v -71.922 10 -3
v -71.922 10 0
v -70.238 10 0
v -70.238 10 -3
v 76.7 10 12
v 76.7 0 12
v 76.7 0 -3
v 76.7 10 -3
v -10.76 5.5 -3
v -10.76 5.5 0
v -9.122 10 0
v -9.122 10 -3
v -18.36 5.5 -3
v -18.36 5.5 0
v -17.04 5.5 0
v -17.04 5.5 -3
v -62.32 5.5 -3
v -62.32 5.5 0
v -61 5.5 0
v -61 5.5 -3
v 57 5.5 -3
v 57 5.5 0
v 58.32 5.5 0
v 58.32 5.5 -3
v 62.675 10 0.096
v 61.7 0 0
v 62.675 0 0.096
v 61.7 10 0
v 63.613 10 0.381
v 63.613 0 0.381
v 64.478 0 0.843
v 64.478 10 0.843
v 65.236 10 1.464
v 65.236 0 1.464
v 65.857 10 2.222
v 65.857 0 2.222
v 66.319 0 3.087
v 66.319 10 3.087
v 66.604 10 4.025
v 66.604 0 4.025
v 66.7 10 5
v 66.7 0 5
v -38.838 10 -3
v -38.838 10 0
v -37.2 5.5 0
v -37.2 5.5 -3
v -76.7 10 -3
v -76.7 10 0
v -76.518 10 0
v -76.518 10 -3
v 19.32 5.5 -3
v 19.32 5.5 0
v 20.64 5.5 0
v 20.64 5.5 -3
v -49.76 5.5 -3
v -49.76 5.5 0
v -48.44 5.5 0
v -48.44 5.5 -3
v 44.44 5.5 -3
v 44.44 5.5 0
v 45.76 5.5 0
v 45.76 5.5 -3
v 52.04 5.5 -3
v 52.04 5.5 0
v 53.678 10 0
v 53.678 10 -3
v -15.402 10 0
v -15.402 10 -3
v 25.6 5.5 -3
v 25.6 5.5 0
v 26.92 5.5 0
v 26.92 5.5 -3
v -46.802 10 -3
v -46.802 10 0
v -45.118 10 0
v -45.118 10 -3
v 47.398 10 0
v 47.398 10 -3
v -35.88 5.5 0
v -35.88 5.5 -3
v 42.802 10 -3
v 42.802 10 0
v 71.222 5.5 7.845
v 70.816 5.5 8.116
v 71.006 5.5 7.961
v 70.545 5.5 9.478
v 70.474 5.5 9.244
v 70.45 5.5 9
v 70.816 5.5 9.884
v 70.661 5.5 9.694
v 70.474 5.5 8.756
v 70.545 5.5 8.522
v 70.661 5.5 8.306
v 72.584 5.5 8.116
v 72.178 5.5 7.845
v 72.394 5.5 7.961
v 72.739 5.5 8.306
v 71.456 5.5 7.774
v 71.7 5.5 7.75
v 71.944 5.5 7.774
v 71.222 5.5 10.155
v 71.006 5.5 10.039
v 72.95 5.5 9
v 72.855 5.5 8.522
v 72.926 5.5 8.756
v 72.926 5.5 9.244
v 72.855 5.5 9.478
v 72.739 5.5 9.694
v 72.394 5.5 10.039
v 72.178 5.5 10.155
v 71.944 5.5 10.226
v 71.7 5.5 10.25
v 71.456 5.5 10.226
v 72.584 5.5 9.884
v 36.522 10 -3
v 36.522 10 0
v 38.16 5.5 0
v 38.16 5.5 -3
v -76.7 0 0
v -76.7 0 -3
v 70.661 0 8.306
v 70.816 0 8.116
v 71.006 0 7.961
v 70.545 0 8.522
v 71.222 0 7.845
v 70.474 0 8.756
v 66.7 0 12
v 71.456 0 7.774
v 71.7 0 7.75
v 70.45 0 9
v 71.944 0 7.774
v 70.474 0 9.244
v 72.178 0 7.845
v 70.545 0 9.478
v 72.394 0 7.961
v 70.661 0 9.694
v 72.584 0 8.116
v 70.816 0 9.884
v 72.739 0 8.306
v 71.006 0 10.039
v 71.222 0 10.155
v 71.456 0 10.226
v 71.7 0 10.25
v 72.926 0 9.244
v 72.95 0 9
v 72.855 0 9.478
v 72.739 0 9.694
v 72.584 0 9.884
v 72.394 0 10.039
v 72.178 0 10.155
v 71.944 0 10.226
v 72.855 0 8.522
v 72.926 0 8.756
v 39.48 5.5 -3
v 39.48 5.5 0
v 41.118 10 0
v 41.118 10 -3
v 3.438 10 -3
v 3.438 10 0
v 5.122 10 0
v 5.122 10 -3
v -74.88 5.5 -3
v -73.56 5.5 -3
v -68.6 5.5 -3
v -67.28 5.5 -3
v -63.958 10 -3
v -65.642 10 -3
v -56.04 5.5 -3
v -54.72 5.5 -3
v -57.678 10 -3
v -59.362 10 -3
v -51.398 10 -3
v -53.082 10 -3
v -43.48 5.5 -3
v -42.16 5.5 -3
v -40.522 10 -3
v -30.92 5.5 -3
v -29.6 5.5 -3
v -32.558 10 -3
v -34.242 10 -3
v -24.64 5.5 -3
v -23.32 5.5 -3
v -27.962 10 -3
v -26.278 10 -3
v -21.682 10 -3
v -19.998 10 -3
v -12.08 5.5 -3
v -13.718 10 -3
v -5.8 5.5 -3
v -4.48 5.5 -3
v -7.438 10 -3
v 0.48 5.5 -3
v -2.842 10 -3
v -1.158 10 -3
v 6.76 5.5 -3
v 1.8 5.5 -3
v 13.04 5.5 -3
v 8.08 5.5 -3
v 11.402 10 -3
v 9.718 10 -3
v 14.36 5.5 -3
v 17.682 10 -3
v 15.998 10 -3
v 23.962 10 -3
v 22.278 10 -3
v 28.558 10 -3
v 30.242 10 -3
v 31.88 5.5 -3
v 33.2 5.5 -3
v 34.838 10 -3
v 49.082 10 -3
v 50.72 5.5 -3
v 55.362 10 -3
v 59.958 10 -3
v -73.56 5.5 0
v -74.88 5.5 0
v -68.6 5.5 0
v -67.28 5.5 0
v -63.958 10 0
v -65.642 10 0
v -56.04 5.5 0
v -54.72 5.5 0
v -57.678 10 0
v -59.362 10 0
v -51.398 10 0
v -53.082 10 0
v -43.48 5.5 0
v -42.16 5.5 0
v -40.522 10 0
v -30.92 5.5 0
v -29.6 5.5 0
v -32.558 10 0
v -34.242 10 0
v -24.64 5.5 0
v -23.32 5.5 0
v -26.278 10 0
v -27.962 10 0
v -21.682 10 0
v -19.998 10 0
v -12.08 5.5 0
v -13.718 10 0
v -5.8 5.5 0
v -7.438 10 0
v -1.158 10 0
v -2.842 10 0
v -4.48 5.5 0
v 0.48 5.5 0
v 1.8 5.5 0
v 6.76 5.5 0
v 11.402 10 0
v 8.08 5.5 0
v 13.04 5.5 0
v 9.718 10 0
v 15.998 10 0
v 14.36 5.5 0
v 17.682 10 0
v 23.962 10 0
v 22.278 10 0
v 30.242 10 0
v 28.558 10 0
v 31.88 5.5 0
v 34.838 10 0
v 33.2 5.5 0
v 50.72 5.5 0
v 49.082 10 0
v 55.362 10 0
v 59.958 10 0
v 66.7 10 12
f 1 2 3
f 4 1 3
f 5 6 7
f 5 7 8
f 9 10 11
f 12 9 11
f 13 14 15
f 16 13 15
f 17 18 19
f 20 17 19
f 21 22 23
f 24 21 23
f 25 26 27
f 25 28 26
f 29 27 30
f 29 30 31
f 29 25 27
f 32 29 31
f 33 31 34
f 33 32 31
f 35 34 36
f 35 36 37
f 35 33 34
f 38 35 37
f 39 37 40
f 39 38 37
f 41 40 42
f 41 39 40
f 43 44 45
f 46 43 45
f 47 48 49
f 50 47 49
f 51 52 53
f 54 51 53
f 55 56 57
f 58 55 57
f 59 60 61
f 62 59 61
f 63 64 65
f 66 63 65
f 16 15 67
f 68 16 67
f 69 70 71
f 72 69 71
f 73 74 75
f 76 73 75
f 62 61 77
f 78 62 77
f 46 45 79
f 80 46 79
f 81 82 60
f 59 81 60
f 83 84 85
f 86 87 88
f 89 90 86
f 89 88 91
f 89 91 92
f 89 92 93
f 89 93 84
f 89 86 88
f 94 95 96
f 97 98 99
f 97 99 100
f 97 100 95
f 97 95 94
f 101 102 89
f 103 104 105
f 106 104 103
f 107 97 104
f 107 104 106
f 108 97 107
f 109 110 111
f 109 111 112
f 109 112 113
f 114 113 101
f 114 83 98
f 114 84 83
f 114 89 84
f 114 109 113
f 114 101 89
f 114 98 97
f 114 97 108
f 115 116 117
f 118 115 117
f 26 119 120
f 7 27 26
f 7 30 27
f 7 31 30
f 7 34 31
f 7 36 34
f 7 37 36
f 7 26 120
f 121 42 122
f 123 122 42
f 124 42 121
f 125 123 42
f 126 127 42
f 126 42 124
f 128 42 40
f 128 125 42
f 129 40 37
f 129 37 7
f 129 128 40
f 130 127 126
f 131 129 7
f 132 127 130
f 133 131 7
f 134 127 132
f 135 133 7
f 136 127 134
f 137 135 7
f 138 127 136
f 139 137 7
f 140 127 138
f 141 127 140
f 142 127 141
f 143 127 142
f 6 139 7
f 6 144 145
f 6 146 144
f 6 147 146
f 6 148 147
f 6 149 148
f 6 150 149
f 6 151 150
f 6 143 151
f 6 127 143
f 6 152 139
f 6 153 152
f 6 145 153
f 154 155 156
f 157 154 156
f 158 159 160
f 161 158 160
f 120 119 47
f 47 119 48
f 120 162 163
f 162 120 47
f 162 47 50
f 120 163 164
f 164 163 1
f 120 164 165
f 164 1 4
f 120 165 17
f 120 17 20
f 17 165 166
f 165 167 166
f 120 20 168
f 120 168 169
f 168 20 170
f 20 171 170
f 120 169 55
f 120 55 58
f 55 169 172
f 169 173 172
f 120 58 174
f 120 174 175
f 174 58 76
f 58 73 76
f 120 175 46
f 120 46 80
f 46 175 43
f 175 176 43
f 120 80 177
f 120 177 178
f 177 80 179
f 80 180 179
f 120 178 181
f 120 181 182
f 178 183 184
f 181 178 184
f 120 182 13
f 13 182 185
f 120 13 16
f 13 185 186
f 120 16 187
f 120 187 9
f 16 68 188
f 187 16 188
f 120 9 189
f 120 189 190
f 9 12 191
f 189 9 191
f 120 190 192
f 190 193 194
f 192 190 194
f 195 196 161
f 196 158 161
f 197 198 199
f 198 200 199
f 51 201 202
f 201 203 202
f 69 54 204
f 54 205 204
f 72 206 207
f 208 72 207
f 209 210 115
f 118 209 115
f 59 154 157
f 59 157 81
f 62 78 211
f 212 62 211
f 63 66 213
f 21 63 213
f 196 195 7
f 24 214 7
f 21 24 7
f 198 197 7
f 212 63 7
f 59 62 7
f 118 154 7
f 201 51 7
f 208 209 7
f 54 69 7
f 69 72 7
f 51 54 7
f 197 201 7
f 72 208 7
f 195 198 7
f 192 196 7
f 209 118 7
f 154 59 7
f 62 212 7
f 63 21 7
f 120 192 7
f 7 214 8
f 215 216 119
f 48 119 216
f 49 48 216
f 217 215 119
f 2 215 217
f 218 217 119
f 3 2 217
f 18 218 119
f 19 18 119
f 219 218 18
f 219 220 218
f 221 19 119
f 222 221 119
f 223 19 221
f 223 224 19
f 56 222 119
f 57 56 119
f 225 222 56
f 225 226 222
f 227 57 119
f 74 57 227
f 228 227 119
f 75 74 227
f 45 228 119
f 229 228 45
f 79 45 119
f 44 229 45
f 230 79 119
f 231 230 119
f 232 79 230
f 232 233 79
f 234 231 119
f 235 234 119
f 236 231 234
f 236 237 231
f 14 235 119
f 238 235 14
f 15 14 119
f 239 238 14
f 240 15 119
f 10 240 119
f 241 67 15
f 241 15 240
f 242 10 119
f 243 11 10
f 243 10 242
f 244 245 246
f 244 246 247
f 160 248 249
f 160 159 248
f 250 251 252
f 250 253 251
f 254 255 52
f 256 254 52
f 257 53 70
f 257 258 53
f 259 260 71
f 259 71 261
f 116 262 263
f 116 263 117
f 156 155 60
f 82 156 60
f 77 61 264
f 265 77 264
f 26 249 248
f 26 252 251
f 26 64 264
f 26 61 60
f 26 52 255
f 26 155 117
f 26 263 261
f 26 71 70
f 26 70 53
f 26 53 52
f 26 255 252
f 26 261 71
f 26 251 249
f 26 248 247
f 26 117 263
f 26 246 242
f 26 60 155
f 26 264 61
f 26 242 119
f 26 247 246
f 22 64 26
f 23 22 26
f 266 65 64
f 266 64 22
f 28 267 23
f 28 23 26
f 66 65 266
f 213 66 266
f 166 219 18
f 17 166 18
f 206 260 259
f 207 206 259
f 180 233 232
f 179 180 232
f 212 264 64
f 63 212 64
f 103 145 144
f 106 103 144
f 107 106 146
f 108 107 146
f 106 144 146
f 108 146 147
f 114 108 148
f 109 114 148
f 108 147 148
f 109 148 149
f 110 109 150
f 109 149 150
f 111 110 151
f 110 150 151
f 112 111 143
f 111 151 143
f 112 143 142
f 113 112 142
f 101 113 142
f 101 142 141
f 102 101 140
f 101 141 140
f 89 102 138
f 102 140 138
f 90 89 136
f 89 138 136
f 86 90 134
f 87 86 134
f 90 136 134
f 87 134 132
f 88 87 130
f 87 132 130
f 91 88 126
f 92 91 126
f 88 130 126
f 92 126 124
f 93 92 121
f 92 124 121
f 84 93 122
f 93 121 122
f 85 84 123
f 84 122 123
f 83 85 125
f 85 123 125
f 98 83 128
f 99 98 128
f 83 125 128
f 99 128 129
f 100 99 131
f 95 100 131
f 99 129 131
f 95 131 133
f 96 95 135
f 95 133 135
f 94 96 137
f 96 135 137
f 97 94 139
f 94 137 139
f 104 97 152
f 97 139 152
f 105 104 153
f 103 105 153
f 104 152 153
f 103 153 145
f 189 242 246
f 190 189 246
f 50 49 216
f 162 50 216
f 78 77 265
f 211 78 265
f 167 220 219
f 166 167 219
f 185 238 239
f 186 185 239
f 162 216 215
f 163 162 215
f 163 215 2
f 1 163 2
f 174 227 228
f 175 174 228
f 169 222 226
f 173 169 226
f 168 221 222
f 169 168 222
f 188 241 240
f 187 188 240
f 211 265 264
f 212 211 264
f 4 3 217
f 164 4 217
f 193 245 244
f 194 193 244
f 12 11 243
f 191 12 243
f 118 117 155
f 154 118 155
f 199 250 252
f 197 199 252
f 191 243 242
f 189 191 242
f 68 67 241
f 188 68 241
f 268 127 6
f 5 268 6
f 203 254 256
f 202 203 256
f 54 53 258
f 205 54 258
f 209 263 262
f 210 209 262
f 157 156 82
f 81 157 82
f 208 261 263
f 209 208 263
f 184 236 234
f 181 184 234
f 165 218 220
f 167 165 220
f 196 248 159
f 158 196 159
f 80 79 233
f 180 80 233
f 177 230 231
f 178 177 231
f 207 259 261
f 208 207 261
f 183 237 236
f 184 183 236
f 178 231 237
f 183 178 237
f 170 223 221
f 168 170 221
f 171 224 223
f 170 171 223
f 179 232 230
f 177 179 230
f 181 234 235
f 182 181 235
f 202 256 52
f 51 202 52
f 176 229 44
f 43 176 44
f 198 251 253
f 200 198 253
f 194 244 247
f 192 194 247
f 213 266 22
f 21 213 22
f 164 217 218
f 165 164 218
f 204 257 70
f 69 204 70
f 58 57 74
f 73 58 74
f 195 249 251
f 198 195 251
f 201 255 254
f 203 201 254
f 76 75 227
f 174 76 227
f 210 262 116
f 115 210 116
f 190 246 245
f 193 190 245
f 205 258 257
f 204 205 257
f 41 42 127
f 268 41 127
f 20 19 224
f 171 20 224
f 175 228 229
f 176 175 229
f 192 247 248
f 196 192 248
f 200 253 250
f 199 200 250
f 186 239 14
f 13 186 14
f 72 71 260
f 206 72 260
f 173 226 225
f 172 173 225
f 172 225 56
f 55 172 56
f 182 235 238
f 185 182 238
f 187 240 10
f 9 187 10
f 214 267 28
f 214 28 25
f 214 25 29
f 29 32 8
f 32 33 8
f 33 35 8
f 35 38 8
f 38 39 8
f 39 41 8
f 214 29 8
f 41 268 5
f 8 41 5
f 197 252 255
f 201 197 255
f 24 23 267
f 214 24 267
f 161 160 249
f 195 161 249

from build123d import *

# Parameters (mm, degrees)
SKETCH_1_W                 = 153.4
SKETCH_1_H                 = 10
EXTRUDE_1_DEPTH            = 3
CUT_EXTRUDE_1_DEPTH        = 4
PATTERN_LINEAR_1_COUNT     = 21
PATTERN_LINEAR_1_PITCH     = 6.28
PATTERN_LINEAR_1_COL_COUNT = 2
PATTERN_LINEAR_1_COL_PITCH = 6.28
SKETCH_3_W                 = 10
SKETCH_3_H                 = 15
EXTRUDE_2_DEPTH            = 10
FILLET_1_R                 = 5
SKETCH_4_R                 = 1.25
CUT_EXTRUDE_2_DEPTH        = 5.5


with BuildPart() as part:
    # 스케치1 → 보스-돌출1 (new body)
    with BuildSketch(Plane.XY):
        with Locations((0, 5)):
            Rectangle(SKETCH_1_W, SKETCH_1_H)
    extrude(amount=-EXTRUDE_1_DEPTH)

    # 스케치2 → 컷-돌출1 (cut, through all)
    with BuildSketch(Plane.XY):
        Polygon((-68.600074414, 5.5), (-67.279925586, 5.5), (-65.642059531, 10), (-70.237940469, 10), align=None)
    cut_extrude_1 = extrude(amount=-CUT_EXTRUDE_1_DEPTH, mode=Mode.SUBTRACT)

    # 선형 패턴1: 컷-돌출1 ×21
    with Locations(*[(i * PATTERN_LINEAR_1_PITCH, 0, 0) for i in range(1, PATTERN_LINEAR_1_COUNT)]):
        add(cut_extrude_1, mode=Mode.SUBTRACT)

    # 선형 패턴1 col: 컷-돌출1 ×2
    with Locations(*[(-i * PATTERN_LINEAR_1_COL_PITCH, 0, 0) for i in range(1, PATTERN_LINEAR_1_COL_COUNT)]):
        add(cut_extrude_1, mode=Mode.SUBTRACT)

    # 스케치3 → 보스-돌출2 (add)
    with BuildSketch(Plane.XZ):
        with Locations((71.7, 4.5)):
            Rectangle(SKETCH_3_W, SKETCH_3_H)
    extrude(amount=-EXTRUDE_2_DEPTH)

    # 필렛1
    fillet_1_edges = [part.edges().sort_by_distance(p)[0] for p in [
        (66.7, 5, 0),
    ]]
    fillet(fillet_1_edges, radius=FILLET_1_R)

    # 스케치4 → 컷-돌출2 (cut)
    with BuildSketch(Plane.XZ):
        with Locations((71.7, 9)):
            Circle(SKETCH_4_R)
    extrude(amount=-CUT_EXTRUDE_2_DEPTH, mode=Mode.SUBTRACT)


solid = part.part
